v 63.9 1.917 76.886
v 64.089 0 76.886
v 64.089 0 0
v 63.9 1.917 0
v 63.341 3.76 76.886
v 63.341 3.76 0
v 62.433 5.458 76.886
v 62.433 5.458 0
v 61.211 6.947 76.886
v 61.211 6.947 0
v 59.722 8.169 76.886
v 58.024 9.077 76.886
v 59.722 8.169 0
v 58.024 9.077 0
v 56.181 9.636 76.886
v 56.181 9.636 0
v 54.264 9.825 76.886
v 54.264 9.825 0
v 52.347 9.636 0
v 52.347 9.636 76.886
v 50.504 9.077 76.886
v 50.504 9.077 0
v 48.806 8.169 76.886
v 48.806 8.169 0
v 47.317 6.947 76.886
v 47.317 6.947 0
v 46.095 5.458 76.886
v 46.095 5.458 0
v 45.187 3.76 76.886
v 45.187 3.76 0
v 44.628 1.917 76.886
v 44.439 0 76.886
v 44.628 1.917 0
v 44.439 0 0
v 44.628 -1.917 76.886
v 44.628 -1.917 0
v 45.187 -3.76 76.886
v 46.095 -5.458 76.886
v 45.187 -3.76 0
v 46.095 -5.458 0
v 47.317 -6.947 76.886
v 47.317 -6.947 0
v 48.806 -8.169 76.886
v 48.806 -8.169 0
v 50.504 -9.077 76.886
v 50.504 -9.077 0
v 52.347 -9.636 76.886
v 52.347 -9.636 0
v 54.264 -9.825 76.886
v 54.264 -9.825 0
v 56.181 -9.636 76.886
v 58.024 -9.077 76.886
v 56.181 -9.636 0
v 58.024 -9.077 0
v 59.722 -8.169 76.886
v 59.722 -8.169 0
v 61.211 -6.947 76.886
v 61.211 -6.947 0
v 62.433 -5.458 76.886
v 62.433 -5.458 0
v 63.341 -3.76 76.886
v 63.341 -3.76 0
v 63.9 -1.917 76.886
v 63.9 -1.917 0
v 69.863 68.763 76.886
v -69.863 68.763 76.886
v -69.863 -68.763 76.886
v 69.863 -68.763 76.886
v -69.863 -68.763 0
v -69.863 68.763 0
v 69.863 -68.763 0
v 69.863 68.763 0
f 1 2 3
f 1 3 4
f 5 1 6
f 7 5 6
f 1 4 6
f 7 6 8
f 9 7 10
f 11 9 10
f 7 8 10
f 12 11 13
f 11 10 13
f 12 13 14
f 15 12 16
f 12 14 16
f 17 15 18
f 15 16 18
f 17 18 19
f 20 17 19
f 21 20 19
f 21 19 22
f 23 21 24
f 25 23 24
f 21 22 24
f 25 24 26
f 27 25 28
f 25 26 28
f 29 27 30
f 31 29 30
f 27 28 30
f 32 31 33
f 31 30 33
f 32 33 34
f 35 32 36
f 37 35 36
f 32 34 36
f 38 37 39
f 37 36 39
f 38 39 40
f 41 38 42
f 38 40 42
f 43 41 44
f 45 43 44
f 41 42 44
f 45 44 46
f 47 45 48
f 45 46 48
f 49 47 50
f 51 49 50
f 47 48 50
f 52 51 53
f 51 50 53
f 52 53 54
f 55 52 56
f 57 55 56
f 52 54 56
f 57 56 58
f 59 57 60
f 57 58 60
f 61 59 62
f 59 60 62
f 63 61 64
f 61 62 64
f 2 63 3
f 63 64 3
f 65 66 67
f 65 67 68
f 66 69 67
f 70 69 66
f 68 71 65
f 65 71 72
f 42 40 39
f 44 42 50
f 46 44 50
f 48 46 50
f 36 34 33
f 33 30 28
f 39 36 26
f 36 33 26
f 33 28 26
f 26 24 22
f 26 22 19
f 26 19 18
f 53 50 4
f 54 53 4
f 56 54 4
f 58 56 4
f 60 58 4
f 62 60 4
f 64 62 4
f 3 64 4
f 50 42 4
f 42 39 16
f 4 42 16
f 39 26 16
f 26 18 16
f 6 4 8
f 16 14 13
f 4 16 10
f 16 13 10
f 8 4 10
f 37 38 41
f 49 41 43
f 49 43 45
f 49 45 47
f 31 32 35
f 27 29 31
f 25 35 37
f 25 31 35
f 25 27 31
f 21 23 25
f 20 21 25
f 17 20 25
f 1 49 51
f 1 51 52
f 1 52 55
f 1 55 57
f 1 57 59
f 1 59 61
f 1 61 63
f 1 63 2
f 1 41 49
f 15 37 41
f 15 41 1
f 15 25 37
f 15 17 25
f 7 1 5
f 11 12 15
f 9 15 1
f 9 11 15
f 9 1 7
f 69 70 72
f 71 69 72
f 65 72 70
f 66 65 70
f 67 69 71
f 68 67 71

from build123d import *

# Parameters (mm, degrees)
F0_W     = 69.8630958796
F0_H     = 137.5265717506
F2_DEPTH = 76.8858
F1_R     = 9.8246353949


# Not quite as in the source:
# - the program builds the solid bodies; features that only make, move or delete a surface that nothing else refers to are left out


with BuildPart() as f2:
    # F0 (on Top) → F2 (new body)
    with BuildSketch(Plane.XY):
        with Locations((34.9315479398, 0)):
            Rectangle(F0_W, F0_H)
        with Locations((-34.9315479398, 0)):
            Rectangle(F0_W, F0_H)
    extrude(amount=F2_DEPTH)


with BuildPart() as f2b:
    # F1 (on Top) → F2, piece 2 (new body)
    with BuildSketch(Plane.XY):
        with Locations((54.2640089989, 0)):
            Circle(F1_R)
    extrude(amount=F2_DEPTH)


solid = Compound([f2.part, f2b.part])
